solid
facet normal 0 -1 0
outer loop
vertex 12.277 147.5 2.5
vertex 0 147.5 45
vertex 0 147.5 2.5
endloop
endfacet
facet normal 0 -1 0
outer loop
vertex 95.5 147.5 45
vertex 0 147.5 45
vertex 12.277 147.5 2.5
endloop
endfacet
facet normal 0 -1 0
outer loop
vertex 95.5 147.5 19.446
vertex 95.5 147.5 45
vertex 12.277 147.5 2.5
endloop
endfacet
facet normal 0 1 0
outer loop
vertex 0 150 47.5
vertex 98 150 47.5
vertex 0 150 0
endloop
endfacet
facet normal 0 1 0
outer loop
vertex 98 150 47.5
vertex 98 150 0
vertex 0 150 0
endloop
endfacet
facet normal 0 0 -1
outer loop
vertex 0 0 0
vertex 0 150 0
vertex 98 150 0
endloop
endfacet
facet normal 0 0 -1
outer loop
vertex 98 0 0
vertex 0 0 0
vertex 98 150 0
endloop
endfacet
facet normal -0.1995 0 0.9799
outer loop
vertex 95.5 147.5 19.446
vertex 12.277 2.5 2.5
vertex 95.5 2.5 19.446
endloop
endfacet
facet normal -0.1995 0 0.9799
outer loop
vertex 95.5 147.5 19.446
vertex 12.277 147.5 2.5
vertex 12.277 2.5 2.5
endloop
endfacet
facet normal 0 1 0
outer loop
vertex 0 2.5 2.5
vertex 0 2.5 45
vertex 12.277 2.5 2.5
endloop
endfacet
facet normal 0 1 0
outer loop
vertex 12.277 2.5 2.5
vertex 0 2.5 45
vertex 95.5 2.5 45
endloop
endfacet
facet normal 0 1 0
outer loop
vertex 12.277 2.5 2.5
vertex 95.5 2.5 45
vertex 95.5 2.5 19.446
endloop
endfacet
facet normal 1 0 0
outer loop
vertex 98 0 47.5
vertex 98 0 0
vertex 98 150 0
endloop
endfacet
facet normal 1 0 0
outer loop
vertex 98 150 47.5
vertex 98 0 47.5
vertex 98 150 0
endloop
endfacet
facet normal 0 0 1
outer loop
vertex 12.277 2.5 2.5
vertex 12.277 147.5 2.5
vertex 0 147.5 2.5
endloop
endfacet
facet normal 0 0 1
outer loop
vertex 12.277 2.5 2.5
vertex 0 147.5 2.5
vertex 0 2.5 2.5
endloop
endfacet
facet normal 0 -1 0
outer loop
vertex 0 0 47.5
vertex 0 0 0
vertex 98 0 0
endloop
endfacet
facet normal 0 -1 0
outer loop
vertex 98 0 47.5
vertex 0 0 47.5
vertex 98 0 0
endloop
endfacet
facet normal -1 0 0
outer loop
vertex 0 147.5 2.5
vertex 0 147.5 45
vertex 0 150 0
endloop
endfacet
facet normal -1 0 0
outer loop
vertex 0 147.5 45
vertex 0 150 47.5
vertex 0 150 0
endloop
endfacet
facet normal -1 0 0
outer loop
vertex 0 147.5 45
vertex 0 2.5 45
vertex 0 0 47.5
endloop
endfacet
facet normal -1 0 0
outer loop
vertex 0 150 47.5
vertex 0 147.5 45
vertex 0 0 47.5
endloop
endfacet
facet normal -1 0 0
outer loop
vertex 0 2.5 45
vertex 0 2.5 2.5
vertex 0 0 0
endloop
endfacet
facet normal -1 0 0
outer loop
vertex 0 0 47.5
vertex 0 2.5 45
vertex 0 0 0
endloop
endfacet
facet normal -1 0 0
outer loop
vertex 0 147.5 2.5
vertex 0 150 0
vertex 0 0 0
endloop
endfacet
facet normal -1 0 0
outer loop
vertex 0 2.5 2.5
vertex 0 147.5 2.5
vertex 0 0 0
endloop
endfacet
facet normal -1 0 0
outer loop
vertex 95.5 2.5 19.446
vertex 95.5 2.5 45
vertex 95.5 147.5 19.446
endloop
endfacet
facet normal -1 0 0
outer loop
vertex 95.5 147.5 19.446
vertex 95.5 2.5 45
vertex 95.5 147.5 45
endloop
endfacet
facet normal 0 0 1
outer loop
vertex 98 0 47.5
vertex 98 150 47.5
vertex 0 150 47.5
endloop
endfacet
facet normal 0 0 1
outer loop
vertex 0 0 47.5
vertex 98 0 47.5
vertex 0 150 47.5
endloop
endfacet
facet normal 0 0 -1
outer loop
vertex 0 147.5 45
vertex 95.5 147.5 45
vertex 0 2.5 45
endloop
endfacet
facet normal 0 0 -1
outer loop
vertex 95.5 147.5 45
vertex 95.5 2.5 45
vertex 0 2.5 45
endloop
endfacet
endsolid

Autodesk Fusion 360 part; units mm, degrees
sketch "Sketch1" plane through (0, 0, 0) normal (0, 0, 1) x (1, 0, 0)
  line L0 (0, 0) -> (98, 0)
  line L1 (98, 0) -> (98, 150)
  line L2 (98, 150) -> (0, 150)
  line L3 (0, 150) -> (0, 0)
  dimension "d1" = 98
  dimension "d2" = 150
extrude "Extrude1" add sketch "Sketch1" along normal blind 45
sketch "Sketch2" plane through (0, 0, 45) normal (0, 0, 1) x (-1, 0, 0)
  line L0 (0, -150) -> (0, 0)
  line L1 (0, 0) -> (-98, 0)
  line L2 (-98, 0) -> (-98, -150)
  line L3 (-98, -150) -> (0, -150)
  line L4 (0, 0) -> (-2.5, 0)
  line L5 (-2.5, 0) -> (-2.5, -2.5)
  line L6 (-2.5, -2.5) -> (-95.5, -2.5)
  line L7 (-95.5, -2.5) -> (-95.5, -147.5)
  line L8 (-95.5, -147.5) -> (-2.5, -147.5)
  line L9 (-2.5, -147.5) -> (-2.5, -2.5)
  dimension "d5" = 2.5
  dimension "d6" = 2.5
  dimension "d7" = 93
  dimension "d8" = 145
extrude "Extrude2" cut sketch "Sketch2" against normal blind 42.5 contours L6 L7 L8 L9
extrude "Extrude3" cut 1 faces at (2.5, 99.1667, 16.6667) along direction (-1, 0, 0) blind 2.5
sketch "Sketch3" plane through (95.5, 0, 0) normal (-1, 0, 0) x (0, -1, 0)
  line L0 (-2.5, 45) -> (-147.5, 45)
  line L1 (-147.5, 45) -> (-147.5, 2.5)
  line L2 (-147.5, 2.5) -> (-2.5, 2.5)
  line L3 (-2.5, 2.5) -> (-2.5, 45)
sketch "Sketch4" plane through (0, 147.5, 0) normal (0, -1, 0) x (1, 0, 0)
  line L0 (95.5, 45) -> (0, 45)
  line L1 (0, 45) -> (0, 2.5)
  line L2 (0, 2.5) -> (95.5, 2.5)
  line L3 (95.5, 2.5) -> (95.5, 45)
  line L4 (0, 0) -> (97.9689, 19.9489)
extrude "Extrude4" add sketch "Sketch4" along normal blind 145 contours L2 L3 L4
sketch "Sketch7" plane through (0, 0, 45) normal (0, 0, 1) x (-1, 0, 0)
  line L0 (0, -147.5) -> (-95.5, -147.5)
  line L1 (-95.5, -147.5) -> (-95.5, -2.5)
  line L2 (-95.5, -2.5) -> (0, -2.5)
  line L3 (0, -2.5) -> (0, 0)
  line L4 (0, 0) -> (-98, 0)
  line L5 (-98, 0) -> (-98, -150)
  line L6 (-98, -150) -> (0, -150)
  line L7 (0, -150) -> (0, -147.5)
  line L8 (-98, 0) -> (0, 0)
  line L9 (0, 0) -> (0, -150)
  line L10 (0, -150) -> (-98, -150)
  line L11 (-98, -150) -> (-98, 0)
  dimension "d19" = 98
  dimension "d20" = 150
extrude "Extrude5" add sketch "Sketch7" along normal blind 2.5
fillet "Fillet1" [suppressed]
fillet "Fillet2" [suppressed]
sketch "Sketch5" plane through (95.5, 0, 0) normal (-1, 0, 0) x (0, -1, 0)
sketch "Sketch6" plane through (95.5, 0, 0) normal (-1, 0, 0) x (0, -1, 0)
